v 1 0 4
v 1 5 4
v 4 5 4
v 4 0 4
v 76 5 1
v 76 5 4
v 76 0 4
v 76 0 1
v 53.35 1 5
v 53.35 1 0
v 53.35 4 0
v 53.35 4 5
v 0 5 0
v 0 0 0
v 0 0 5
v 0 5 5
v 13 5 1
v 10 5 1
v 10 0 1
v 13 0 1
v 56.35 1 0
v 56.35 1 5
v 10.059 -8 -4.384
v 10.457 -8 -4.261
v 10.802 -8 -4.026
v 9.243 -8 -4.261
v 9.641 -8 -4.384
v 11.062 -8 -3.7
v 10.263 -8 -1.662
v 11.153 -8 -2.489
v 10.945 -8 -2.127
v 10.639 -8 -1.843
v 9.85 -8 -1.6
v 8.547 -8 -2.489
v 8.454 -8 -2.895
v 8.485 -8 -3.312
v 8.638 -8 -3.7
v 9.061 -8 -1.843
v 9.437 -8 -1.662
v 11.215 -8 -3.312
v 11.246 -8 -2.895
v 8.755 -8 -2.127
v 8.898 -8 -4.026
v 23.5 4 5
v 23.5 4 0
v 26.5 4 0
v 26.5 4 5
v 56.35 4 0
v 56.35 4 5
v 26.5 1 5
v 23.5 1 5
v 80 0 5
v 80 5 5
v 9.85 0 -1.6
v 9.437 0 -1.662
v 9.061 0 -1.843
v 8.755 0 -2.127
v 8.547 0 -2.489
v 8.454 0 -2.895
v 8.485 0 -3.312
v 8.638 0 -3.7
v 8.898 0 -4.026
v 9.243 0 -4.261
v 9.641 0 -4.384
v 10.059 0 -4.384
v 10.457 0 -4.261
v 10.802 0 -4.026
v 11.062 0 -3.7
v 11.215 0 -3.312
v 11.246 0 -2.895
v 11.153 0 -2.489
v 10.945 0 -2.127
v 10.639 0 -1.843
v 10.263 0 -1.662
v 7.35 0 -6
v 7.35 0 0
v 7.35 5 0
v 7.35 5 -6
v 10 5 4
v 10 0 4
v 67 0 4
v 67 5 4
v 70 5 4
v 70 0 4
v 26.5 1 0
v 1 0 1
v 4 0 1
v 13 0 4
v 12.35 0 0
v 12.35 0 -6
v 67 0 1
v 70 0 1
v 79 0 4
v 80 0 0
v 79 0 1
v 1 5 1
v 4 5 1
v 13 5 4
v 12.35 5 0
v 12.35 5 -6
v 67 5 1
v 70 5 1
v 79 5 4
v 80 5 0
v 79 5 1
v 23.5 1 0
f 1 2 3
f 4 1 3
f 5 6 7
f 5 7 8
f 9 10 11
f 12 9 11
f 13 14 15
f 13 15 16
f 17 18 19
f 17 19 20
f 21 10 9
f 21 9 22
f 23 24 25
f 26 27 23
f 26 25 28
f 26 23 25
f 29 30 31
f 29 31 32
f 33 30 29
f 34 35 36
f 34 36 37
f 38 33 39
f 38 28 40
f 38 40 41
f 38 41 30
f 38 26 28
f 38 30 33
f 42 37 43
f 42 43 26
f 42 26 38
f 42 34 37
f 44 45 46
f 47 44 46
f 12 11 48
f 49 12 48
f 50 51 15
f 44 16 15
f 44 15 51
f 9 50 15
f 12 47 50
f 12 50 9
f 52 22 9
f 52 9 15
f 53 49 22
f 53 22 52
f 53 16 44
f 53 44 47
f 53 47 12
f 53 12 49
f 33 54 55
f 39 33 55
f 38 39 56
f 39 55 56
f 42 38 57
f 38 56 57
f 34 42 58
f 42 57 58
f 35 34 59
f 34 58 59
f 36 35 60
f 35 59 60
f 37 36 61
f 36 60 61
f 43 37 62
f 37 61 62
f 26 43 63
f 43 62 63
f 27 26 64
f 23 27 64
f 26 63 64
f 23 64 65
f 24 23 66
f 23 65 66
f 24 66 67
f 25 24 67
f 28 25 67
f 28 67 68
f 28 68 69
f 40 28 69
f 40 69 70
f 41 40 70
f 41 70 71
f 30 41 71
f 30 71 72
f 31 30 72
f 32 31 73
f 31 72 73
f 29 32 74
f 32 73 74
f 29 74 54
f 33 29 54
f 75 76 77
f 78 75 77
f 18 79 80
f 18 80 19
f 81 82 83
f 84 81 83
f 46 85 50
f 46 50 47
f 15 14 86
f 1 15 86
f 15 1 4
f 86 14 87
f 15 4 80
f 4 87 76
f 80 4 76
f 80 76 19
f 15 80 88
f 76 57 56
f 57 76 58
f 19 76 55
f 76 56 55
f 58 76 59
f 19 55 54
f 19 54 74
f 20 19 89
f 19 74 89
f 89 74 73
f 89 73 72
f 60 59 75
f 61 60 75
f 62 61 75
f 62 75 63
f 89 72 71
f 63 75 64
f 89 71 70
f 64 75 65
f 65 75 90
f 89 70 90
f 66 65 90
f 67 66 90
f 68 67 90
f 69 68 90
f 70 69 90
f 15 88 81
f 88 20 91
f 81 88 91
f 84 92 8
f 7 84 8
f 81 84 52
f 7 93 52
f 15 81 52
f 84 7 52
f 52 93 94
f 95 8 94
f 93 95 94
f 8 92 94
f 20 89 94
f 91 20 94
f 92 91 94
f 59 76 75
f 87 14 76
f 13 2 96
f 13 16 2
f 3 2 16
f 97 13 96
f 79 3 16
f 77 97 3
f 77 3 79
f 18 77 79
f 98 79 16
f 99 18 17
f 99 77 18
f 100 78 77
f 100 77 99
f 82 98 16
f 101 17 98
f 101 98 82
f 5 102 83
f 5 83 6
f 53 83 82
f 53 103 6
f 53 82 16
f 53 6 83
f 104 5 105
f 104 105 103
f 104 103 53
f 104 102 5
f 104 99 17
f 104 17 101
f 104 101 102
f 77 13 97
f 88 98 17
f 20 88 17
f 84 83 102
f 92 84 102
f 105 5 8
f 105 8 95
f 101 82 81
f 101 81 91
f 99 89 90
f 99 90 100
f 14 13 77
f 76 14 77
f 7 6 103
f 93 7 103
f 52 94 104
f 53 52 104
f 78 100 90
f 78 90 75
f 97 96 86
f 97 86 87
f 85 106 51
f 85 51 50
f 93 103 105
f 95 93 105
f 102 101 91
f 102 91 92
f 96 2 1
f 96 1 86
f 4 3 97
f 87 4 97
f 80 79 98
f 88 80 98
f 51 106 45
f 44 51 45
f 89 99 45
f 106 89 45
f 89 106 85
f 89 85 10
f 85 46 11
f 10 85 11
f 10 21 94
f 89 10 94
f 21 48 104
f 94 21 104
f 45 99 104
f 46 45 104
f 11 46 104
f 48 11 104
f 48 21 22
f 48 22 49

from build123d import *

# Parameters (mm, degrees)
SKETCH1_W           = 80
SKETCH1_H           = 5
SKETCH1_W_2         = 3
SKETCH1_H_2         = 3
BOSS_EXTRUDE1_DEPTH = 5
SKETCH2_W           = 3
SKETCH2_H           = 3
CUT_EXTRUDE1_DEPTH  = 5
SKETCH3_W           = 5
SKETCH3_H           = 5
BOSS_EXTRUDE2_DEPTH = 6
SKETCH4_R           = 1.4
BOSS_EXTRUDE3_DEPTH = 8


with BuildPart() as part:
    # Sketch1 → Boss-Extrude1 (new body)
    with BuildSketch(Plane.XY):
        with Locations((40, 2.5)):
            Rectangle(SKETCH1_W, SKETCH1_H)
        with Locations((54.85, 2.5)):
            Rectangle(SKETCH1_W_2, SKETCH1_H_2, mode=Mode.SUBTRACT)
        with Locations((25, 2.5)):
            Rectangle(SKETCH1_W_2, SKETCH1_H_2, mode=Mode.SUBTRACT)
    extrude(amount=BOSS_EXTRUDE1_DEPTH)

    # Sketch2 → Cut-Extrude1 (cut)
    with BuildSketch(Plane(origin=(0, 5, 0), x_dir=(1, 0, 0), z_dir=(0, 1, 0))):
        with Locations((77.5, -2.5)):
            Rectangle(SKETCH2_W, SKETCH2_H)
        with Locations((2.5, -2.5)):
            Rectangle(SKETCH2_W, SKETCH2_H)
        with Locations((11.5, -2.5)):
            Rectangle(SKETCH2_W, SKETCH2_H)
        with Locations((68.5, -2.5)):
            Rectangle(SKETCH2_W, SKETCH2_H)
    extrude(amount=-CUT_EXTRUDE1_DEPTH, mode=Mode.SUBTRACT)

    # Sketch3 → Boss-Extrude2 (add)
    with BuildSketch(Plane(origin=(0, 0, 0), x_dir=(-1, 0, 0), z_dir=(0, 0, -1))):
        with Locations((-9.85, 2.5)):
            Rectangle(SKETCH3_W, SKETCH3_H)
    extrude(amount=BOSS_EXTRUDE2_DEPTH)

    # Sketch4 → Boss-Extrude3 (add)
    with BuildSketch(Plane.XZ):
        with Locations(Location((9.85, -3, 0), (0, 0, 90))):
            Circle(SKETCH4_R)
    extrude(amount=BOSS_EXTRUDE3_DEPTH)


solid = part.part
